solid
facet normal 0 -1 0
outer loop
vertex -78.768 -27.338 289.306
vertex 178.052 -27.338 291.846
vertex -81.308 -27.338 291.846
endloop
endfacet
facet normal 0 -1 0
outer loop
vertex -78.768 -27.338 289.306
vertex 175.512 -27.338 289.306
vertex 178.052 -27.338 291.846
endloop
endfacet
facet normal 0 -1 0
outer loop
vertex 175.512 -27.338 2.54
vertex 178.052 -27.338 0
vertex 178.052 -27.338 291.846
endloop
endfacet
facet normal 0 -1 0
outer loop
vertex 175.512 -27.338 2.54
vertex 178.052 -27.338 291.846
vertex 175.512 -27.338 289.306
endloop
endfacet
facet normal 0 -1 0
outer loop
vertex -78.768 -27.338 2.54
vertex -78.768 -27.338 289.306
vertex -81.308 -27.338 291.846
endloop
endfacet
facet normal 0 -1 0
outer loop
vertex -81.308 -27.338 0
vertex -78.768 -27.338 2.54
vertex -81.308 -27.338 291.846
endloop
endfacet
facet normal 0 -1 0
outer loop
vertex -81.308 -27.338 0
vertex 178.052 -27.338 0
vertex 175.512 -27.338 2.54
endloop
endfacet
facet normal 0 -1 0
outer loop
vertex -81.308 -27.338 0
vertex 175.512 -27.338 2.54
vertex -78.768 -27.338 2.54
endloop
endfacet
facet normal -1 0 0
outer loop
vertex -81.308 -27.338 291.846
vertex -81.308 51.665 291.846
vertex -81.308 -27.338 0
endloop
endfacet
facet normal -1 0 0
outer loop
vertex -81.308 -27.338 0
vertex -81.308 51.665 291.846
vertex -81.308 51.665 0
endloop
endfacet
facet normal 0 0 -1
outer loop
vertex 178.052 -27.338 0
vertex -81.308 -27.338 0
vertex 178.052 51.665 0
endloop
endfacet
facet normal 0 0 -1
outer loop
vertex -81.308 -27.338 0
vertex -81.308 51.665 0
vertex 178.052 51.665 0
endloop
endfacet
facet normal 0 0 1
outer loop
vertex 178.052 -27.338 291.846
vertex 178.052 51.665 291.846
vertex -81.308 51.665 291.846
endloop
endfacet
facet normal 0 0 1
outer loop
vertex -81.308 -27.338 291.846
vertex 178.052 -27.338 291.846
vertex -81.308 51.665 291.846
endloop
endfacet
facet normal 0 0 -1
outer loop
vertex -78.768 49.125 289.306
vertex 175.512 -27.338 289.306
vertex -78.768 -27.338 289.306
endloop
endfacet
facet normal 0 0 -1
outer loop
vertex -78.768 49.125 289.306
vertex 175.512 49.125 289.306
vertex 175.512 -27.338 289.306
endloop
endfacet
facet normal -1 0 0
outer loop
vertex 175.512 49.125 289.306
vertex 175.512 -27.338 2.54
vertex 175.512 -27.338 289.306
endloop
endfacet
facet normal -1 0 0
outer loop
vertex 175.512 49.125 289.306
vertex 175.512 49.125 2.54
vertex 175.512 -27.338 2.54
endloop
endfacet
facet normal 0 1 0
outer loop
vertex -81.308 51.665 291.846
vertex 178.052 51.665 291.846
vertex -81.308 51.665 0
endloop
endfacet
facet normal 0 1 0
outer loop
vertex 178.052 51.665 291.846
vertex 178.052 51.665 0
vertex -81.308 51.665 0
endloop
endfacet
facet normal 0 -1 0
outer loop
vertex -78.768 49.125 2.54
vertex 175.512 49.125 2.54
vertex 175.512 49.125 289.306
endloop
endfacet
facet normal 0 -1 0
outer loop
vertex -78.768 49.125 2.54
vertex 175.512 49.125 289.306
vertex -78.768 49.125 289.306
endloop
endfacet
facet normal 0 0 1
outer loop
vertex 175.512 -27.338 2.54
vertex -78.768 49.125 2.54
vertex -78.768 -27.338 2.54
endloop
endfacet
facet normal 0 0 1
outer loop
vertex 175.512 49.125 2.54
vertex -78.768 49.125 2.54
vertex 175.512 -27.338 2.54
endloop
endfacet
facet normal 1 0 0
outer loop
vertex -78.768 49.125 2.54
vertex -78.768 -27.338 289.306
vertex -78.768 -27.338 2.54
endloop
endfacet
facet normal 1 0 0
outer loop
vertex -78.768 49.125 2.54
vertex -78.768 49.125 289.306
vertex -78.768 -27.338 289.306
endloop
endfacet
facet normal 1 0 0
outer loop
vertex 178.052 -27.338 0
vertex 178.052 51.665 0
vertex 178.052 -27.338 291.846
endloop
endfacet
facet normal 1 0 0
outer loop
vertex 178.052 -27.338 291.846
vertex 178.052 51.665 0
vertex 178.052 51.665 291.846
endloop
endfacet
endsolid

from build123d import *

# Parameters (mm, degrees)
F0_W     = 76.2264374644
F0_H     = 25.4088118672
F1_DEPTH = 113.792
F2_DEPTH = 183.134
F3_DEPTH = 178.054
F4_DEPTH = 53.594
F5_T     = -2.54


with BuildPart() as f1:
    # F0 (on Top) → F1 (new body)
    with BuildSketch(Plane.XY):
        with Locations((-43.1949794292, 38.960184902)):
            Rectangle(F0_W, F0_H)
    extrude(amount=F1_DEPTH)

    # F2 (add): a face of the model
    f2_faces = [f1.faces().sort_by_distance(p)[0] for p in [
        (-5.0817606971, 38.960184902, 56.896),
    ]]
    extrude(f2_faces, amount=F2_DEPTH)

    # F3 (add): a face of the model
    f3_faces = [f1.faces().sort_by_distance(p)[0] for p in [
        (48.3720205708, 38.960184902, 113.792),
    ]]
    extrude(f3_faces, amount=F3_DEPTH)

    # F4 (add): a face of the model
    f4_faces = [f1.faces().sort_by_distance(p)[0] for p in [
        (48.3720205708, 26.2557789683, 145.923),
    ]]
    extrude(f4_faces, amount=F4_DEPTH)

    # F5
    f5_openings = [f1.faces().sort_by_distance(p)[0] for p in [
        (48.372021, -27.338221, 145.923),
    ]]
    offset(amount=F5_T, openings=f5_openings)


solid = f1.part
